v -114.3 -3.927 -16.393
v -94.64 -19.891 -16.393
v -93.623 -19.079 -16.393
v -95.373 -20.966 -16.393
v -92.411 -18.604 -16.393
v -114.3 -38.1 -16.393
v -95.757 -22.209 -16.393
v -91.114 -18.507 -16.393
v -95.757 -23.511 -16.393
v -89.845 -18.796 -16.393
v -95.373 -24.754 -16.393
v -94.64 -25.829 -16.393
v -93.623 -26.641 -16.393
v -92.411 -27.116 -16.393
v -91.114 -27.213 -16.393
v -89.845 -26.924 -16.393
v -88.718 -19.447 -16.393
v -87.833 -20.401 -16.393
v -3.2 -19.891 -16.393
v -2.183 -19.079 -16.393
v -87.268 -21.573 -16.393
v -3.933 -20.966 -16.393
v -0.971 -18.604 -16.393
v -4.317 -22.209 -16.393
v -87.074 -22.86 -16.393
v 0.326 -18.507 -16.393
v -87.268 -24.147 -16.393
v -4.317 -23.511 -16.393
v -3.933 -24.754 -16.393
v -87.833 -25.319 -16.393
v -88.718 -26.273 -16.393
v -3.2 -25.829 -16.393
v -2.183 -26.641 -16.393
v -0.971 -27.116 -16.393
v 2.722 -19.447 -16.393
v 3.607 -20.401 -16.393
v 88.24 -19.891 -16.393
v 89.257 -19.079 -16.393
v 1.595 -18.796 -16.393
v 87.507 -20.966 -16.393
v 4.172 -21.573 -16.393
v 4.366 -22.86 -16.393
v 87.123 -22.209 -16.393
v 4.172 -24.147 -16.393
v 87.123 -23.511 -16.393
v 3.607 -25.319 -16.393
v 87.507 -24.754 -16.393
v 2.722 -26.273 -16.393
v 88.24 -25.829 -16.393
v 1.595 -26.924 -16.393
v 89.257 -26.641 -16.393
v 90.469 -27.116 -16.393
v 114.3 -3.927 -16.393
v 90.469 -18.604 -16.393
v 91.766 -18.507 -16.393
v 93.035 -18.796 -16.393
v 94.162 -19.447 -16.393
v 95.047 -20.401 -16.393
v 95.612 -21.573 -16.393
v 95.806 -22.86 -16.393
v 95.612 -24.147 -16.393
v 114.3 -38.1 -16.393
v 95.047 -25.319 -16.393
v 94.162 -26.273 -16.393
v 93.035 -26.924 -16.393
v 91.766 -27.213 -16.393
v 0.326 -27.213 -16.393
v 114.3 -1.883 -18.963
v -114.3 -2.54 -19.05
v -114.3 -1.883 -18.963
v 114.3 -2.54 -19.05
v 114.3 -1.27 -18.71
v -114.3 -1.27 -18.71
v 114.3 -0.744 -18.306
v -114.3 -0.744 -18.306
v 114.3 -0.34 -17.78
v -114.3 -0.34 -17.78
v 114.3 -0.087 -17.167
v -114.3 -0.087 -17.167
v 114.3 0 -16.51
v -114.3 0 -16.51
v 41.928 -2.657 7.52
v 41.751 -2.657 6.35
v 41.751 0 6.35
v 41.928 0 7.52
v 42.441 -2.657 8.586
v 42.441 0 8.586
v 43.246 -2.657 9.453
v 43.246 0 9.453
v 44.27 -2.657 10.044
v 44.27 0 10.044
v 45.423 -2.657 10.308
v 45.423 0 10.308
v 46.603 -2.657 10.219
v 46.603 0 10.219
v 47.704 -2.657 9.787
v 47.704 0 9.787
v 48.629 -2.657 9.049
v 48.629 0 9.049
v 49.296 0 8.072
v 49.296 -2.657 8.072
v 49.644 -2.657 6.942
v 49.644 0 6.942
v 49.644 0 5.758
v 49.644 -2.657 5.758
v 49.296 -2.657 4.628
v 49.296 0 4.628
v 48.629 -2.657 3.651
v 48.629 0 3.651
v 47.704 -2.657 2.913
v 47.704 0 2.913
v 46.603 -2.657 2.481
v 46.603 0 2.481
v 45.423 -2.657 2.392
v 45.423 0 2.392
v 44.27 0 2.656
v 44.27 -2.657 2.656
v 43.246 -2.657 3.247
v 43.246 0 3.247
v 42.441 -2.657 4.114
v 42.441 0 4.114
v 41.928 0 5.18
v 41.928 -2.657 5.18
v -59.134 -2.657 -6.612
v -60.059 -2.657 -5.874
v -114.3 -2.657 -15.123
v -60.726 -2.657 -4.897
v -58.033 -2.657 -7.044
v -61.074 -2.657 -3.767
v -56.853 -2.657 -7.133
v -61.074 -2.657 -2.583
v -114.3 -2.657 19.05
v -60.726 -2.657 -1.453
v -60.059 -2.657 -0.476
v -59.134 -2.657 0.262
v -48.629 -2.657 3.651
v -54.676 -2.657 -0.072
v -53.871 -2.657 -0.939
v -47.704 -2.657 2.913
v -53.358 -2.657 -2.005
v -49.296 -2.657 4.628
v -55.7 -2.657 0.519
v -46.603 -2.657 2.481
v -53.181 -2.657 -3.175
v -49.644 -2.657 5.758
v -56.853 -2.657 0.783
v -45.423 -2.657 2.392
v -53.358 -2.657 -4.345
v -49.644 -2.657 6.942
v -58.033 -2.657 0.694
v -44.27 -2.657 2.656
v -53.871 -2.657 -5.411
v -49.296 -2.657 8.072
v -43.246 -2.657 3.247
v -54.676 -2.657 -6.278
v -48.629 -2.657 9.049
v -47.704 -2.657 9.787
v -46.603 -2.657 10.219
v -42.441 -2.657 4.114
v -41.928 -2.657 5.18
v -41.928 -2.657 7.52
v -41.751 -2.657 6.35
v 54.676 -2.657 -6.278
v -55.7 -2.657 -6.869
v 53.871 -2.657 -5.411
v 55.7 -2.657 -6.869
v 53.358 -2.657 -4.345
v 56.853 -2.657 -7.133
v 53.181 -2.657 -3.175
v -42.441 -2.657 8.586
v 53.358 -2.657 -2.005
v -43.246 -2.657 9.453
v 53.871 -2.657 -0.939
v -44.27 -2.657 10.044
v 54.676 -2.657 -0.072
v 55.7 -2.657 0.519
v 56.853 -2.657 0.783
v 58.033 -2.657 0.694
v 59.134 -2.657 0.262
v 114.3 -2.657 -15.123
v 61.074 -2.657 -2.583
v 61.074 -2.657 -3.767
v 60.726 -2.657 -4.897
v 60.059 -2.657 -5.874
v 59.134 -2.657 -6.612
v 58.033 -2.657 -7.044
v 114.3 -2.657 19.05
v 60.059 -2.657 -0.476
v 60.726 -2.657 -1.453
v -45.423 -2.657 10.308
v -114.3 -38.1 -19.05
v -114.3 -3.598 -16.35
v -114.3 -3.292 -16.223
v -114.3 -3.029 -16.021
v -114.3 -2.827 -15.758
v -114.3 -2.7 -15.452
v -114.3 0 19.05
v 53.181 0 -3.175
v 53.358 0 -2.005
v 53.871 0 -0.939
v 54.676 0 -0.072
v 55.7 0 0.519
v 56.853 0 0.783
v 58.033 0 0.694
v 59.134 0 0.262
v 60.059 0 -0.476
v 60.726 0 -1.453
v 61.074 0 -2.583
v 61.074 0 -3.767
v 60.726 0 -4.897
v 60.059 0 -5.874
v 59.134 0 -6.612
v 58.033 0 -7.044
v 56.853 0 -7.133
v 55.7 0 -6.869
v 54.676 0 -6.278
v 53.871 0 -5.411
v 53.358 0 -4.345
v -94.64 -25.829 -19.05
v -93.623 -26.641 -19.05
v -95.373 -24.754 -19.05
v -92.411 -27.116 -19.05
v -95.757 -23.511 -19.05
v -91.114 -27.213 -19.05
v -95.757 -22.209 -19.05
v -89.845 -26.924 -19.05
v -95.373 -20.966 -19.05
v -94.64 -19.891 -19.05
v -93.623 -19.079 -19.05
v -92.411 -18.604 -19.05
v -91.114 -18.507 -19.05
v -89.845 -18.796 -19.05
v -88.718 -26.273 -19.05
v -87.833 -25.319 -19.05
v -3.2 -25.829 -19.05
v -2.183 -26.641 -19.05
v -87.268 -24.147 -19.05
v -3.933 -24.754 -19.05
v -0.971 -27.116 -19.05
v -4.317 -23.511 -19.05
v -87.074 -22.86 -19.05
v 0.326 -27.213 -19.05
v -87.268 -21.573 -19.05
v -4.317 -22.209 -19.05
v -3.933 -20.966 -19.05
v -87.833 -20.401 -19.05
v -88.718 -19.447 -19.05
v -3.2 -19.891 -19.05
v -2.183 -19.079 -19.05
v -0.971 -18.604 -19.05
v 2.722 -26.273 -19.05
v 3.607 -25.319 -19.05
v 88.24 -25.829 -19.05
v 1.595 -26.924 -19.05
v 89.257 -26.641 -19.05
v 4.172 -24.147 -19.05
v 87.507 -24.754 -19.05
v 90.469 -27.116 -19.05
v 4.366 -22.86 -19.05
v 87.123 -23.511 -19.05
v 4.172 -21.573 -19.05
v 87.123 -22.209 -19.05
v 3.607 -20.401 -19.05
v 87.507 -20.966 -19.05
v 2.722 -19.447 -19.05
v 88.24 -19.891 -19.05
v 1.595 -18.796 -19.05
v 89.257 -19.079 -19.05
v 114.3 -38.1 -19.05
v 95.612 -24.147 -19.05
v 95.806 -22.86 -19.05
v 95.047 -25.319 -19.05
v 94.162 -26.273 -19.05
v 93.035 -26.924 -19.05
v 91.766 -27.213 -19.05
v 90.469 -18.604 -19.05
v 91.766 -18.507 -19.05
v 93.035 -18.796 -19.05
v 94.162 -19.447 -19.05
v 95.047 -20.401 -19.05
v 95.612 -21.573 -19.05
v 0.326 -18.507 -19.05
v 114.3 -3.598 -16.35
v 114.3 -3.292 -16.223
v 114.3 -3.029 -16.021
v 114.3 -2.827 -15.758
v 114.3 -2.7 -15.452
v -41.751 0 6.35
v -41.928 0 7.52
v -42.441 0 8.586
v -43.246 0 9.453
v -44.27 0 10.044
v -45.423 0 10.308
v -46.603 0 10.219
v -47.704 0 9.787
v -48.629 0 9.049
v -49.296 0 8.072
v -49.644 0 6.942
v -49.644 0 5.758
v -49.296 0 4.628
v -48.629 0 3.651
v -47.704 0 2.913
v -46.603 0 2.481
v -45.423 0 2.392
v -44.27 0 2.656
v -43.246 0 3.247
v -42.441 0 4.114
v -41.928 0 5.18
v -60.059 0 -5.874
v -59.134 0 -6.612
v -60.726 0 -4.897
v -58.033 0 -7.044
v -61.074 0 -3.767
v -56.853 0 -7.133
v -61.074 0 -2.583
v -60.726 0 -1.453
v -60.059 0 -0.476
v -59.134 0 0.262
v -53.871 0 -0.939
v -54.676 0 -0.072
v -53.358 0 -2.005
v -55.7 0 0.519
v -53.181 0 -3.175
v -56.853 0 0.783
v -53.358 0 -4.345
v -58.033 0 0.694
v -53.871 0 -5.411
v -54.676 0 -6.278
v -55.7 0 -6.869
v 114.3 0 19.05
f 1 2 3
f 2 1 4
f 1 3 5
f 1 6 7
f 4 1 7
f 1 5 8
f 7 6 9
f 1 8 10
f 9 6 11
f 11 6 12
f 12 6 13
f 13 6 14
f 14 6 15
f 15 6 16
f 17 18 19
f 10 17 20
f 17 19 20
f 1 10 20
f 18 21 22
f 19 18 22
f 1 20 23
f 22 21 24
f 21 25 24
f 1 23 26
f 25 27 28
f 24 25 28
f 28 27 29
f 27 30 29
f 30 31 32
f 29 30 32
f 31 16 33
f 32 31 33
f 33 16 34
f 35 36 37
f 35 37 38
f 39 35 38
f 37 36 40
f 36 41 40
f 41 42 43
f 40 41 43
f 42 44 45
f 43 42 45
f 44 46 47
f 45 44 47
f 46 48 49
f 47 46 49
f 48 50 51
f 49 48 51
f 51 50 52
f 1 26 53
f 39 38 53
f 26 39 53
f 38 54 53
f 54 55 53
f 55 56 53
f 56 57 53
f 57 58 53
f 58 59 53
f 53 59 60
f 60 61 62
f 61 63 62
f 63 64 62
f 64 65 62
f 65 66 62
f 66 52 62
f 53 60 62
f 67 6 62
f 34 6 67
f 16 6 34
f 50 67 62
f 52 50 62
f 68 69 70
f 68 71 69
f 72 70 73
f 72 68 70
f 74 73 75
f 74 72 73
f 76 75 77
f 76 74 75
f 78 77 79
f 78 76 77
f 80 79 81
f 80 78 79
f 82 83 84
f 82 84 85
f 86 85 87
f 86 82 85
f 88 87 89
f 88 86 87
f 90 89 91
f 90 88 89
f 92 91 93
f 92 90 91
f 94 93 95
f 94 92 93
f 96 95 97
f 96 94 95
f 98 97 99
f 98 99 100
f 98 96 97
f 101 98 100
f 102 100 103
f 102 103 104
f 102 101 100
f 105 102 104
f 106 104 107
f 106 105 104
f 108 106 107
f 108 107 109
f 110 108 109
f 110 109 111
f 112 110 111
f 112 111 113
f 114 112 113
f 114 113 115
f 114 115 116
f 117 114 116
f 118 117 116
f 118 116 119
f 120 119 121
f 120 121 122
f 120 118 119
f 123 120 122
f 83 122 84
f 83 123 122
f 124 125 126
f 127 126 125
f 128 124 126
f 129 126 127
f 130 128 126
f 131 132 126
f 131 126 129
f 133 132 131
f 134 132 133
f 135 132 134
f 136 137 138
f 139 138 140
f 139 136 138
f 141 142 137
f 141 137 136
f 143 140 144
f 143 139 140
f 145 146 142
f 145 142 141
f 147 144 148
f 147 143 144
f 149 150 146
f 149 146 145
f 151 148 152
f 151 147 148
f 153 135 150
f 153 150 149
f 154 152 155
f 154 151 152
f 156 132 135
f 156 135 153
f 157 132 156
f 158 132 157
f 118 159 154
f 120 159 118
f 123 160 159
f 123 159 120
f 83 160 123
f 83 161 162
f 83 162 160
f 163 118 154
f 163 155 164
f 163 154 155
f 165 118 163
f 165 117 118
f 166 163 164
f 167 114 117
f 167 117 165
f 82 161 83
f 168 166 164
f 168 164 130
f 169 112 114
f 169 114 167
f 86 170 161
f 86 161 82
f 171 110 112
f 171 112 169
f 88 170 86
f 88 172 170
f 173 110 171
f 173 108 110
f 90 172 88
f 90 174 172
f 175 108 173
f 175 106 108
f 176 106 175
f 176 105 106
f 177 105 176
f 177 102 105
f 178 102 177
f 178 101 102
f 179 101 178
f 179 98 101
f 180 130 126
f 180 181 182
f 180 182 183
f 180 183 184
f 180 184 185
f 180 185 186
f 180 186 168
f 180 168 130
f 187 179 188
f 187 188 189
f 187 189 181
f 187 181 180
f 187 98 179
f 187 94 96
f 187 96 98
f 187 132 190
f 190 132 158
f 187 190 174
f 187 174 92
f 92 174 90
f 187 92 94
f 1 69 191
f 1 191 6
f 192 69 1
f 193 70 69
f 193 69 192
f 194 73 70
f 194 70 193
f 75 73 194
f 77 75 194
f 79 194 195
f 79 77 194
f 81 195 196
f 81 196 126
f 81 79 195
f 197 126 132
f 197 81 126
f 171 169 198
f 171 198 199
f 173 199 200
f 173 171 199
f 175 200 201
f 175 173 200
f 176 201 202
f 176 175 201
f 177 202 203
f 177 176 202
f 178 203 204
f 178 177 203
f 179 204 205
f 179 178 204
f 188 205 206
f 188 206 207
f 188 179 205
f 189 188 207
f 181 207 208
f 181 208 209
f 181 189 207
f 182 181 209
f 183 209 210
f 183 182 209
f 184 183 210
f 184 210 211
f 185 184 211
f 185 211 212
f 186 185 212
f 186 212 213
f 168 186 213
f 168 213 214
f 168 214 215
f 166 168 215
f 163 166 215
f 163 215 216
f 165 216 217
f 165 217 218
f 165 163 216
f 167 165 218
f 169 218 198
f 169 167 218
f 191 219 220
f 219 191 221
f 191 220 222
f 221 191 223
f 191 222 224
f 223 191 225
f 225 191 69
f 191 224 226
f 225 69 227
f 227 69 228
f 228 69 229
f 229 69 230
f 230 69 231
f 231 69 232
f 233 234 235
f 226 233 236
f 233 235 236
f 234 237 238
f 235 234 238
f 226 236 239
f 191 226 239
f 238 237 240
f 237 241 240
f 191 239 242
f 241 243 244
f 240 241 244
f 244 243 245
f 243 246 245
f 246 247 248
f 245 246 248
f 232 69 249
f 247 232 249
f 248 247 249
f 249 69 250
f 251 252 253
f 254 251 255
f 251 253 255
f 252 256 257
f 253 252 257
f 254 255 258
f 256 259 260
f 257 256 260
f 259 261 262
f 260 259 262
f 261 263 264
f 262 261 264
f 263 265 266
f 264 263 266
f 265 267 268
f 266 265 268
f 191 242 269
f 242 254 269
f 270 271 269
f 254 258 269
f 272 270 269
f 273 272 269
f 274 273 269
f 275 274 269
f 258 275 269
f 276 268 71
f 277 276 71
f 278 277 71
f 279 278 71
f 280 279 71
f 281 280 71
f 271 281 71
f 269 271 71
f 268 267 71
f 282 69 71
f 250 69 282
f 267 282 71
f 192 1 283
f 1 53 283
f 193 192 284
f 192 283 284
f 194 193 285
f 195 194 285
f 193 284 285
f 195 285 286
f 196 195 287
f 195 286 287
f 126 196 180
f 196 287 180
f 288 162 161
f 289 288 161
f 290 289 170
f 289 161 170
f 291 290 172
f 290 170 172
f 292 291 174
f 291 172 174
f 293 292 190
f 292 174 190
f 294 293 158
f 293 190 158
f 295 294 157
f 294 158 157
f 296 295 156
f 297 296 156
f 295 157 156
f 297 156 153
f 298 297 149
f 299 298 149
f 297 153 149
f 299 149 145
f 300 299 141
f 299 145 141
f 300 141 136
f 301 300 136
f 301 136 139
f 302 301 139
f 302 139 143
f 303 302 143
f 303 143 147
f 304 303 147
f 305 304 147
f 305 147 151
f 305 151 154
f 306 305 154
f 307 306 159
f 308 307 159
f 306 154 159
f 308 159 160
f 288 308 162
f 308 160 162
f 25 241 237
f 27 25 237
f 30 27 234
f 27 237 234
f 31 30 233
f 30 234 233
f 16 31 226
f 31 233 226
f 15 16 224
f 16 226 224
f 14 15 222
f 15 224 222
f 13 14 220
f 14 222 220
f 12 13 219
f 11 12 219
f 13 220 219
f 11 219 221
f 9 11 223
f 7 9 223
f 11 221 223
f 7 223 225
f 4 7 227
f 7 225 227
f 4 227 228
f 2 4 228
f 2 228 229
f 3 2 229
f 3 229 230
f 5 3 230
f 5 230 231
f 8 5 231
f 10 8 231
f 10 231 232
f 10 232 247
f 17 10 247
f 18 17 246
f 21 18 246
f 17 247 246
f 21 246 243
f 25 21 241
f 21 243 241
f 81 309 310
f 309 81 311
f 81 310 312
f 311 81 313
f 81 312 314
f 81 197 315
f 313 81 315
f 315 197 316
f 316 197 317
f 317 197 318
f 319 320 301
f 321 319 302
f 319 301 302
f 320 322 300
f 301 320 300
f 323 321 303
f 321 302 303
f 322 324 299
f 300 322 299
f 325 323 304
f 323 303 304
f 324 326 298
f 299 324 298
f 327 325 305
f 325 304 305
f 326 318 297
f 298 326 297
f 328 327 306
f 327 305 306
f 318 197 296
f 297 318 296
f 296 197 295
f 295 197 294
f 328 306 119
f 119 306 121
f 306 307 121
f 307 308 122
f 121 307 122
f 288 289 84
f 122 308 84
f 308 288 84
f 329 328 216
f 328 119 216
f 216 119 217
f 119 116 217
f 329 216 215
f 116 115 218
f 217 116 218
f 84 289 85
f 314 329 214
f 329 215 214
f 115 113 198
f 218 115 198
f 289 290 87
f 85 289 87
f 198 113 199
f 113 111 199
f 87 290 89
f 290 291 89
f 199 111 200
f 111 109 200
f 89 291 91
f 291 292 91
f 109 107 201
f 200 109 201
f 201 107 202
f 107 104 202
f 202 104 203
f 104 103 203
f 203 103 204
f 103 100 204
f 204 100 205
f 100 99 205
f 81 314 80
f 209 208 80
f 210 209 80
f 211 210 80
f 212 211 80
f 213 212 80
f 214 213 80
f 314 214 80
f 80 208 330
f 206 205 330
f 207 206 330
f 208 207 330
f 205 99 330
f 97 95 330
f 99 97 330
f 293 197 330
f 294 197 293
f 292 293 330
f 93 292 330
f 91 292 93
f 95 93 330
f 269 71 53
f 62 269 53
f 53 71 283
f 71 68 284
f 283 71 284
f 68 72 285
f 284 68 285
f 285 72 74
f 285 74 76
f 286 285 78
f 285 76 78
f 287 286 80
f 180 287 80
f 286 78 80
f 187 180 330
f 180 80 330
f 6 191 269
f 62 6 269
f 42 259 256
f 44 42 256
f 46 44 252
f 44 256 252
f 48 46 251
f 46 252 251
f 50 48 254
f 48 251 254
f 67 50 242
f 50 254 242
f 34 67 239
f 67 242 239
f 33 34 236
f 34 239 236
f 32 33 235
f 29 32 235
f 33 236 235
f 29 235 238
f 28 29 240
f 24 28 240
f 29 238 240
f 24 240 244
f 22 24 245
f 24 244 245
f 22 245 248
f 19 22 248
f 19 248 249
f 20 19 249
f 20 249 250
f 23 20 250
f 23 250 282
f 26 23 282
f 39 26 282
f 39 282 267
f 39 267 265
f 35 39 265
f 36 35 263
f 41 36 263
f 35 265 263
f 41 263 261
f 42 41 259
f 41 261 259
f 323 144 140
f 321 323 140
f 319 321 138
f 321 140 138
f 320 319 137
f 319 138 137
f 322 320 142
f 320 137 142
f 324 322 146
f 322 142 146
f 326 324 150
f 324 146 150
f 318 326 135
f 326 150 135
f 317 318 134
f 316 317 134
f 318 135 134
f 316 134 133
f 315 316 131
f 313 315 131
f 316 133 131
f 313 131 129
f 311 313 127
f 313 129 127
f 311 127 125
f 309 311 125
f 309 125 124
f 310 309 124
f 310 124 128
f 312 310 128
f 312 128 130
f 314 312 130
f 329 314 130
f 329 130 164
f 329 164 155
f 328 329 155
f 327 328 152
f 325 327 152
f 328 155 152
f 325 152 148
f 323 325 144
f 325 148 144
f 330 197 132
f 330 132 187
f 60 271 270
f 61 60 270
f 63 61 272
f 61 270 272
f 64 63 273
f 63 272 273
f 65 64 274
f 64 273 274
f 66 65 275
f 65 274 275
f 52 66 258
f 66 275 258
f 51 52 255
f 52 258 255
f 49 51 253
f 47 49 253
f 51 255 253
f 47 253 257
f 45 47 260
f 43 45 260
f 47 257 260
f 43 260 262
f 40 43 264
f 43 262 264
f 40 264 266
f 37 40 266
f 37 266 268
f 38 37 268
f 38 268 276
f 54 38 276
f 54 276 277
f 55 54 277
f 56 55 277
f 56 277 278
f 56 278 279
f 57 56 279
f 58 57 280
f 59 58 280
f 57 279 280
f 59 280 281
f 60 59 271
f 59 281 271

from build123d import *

# Parameters (mm, degrees)
F0_W     = 228.6
F0_H     = 38.1
F1_DEPTH = 2.65684
F2_W     = 228.6
F2_H     = 38.1
F3_DEPTH = 2.65684
F4_R     = 3.96875
F5_DEPTH = 2.65684
F6_R     = 4.365625
F7_DEPTH = 2.65684
F8_R     = 2.54
F9_R     = 1.27


# Not quite as in the source:
# - a pattern or mirror of a feature is missing from the dataset's text; its kind, count and spacing are read off the source's solid


with BuildPart() as f1:
    # F0 (on Front) → F1 (new body)
    with BuildSketch(Plane.XZ):
        Rectangle(F0_W, F0_H)
    extrude(amount=F1_DEPTH)

    # F2 (on face) → F3 (join)
    with BuildSketch(Plane(origin=(0, 0, -19.05), x_dir=(1, 0, 0), z_dir=(0, 0, -1))):
        with Locations((0, 19.05)):
            Rectangle(F2_W, F2_H)
    extrude(amount=-F3_DEPTH)

    # F4 (on face) → F5 (cut)
    with BuildSketch(Plane.XZ.offset(2.65684)):
        with Locations((-45.72, 6.35)):
            Circle(F4_R)
        with Locations((-57.15, -3.175)):
            Circle(F4_R)
    f5 = extrude(amount=-F5_DEPTH, mode=Mode.SUBTRACT)

    # F5_copies: F5 across plane
    add(f5.mirror(Plane(origin=(0, 0, 0), x_dir=(0, 0, 1), z_dir=(1, 0, 0))), mode=Mode.SUBTRACT)

    # F6 (on face) → F7 (cut)
    with BuildSketch(Plane(origin=(0, 0, -19.05), x_dir=(1, 0, 0), z_dir=(0, 0, -1))):
        with Locations((-91.44, 22.86)):
            Circle(F6_R)
        with Locations((0, 22.86)):
            Circle(F6_R)
        with Locations((91.44, 22.86)):
            Circle(F6_R)
    extrude(amount=-F7_DEPTH, mode=Mode.SUBTRACT)

    # F8
    f8_edges = [f1.edges().sort_by_distance(p)[0] for p in [
        (0, 0, -19.05),
    ]]
    fillet(f8_edges, radius=F8_R)

    # F9
    f9_edges = [f1.edges().sort_by_distance(p)[0] for p in [
        (0, -2.65684, -16.39316),
    ]]
    fillet(f9_edges, radius=F9_R)


solid = f1.part
